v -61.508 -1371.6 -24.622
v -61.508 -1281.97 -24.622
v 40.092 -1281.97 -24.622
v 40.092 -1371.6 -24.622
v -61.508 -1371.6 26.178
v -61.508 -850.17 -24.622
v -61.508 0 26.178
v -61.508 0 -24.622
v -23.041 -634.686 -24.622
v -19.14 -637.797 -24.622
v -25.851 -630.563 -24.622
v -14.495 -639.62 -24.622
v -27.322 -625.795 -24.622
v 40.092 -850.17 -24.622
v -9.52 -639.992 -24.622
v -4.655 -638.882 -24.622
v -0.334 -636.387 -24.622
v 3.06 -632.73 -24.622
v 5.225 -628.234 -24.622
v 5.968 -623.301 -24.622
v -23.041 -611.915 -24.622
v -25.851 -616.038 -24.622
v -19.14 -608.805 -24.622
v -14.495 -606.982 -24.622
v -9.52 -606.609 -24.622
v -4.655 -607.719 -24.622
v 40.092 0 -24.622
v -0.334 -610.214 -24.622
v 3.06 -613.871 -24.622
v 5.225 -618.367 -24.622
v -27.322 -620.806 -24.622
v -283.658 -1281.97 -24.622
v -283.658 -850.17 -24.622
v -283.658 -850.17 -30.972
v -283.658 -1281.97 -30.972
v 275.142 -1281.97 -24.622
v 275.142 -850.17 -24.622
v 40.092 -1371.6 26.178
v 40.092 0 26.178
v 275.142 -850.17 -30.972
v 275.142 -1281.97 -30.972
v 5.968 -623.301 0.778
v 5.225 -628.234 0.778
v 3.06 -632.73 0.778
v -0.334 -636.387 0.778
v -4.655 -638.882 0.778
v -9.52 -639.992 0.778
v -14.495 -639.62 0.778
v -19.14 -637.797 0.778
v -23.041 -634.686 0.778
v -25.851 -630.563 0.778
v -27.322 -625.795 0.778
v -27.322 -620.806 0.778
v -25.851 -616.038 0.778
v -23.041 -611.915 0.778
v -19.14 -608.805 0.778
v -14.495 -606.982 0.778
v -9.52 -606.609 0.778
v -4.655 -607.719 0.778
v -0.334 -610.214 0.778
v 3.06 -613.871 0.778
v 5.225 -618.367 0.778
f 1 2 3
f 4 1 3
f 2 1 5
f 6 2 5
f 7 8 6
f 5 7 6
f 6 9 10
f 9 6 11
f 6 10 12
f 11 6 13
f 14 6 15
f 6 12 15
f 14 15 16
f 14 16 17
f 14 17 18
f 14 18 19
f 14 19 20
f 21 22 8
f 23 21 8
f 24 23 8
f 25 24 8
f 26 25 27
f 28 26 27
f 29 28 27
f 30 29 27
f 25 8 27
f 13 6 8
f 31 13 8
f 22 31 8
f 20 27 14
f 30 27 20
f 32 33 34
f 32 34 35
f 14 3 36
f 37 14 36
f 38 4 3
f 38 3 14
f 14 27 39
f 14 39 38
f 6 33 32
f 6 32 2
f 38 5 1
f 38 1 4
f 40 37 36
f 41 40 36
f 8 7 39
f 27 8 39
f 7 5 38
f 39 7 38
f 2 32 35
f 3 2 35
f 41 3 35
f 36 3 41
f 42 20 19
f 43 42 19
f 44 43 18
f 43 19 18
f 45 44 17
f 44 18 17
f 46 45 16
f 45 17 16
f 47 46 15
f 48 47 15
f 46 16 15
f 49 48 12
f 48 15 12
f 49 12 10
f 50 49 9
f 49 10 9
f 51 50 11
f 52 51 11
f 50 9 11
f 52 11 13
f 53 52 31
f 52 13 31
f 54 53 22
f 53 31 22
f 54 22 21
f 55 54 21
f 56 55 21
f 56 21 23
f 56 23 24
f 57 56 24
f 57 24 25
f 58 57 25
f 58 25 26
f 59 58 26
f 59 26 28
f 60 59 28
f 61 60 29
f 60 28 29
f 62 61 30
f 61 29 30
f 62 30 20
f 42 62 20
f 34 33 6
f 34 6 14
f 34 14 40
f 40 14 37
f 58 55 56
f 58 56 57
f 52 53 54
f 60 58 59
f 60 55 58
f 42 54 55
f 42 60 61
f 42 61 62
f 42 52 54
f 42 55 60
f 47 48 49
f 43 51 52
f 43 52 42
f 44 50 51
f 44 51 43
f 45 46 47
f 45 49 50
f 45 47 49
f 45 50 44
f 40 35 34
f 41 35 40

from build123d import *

# Parameters (mm, degrees)
F0_W     = 101.6
F0_H     = 50.8
F1_DEPTH = 1371.6
F2_R     = 16.7386
F3_DEPTH = 25.4
F4_W     = 558.8
F4_H     = 431.8
F5_DEPTH = 6.35


with BuildPart() as f1:
    # F0 (on Front) → F1 (new body)
    with BuildSketch(Plane.XZ):
        with Locations((-10.707563, 0.777875)):
            Rectangle(F0_W, F0_H)
    extrude(amount=F1_DEPTH)

    # F2 (on face) → F3 (cut)
    with BuildSketch(Plane(origin=(0, 0, -24.622125), x_dir=(1, 0, 0), z_dir=(0, 0, -1))):
        with Locations((-10.770437, 623.300626)):
            Circle(F2_R)
    extrude(amount=-F3_DEPTH, mode=Mode.SUBTRACT)

    # F4 (on face) → F5 (join)
    with BuildSketch(Plane(origin=(0, 0, -24.622125), x_dir=(1, 0, 0), z_dir=(0, 0, -1))):
        with Locations((-4.258305, 1066.069934)):
            Rectangle(F4_W, F4_H)
    extrude(amount=F5_DEPTH)


solid = f1.part
